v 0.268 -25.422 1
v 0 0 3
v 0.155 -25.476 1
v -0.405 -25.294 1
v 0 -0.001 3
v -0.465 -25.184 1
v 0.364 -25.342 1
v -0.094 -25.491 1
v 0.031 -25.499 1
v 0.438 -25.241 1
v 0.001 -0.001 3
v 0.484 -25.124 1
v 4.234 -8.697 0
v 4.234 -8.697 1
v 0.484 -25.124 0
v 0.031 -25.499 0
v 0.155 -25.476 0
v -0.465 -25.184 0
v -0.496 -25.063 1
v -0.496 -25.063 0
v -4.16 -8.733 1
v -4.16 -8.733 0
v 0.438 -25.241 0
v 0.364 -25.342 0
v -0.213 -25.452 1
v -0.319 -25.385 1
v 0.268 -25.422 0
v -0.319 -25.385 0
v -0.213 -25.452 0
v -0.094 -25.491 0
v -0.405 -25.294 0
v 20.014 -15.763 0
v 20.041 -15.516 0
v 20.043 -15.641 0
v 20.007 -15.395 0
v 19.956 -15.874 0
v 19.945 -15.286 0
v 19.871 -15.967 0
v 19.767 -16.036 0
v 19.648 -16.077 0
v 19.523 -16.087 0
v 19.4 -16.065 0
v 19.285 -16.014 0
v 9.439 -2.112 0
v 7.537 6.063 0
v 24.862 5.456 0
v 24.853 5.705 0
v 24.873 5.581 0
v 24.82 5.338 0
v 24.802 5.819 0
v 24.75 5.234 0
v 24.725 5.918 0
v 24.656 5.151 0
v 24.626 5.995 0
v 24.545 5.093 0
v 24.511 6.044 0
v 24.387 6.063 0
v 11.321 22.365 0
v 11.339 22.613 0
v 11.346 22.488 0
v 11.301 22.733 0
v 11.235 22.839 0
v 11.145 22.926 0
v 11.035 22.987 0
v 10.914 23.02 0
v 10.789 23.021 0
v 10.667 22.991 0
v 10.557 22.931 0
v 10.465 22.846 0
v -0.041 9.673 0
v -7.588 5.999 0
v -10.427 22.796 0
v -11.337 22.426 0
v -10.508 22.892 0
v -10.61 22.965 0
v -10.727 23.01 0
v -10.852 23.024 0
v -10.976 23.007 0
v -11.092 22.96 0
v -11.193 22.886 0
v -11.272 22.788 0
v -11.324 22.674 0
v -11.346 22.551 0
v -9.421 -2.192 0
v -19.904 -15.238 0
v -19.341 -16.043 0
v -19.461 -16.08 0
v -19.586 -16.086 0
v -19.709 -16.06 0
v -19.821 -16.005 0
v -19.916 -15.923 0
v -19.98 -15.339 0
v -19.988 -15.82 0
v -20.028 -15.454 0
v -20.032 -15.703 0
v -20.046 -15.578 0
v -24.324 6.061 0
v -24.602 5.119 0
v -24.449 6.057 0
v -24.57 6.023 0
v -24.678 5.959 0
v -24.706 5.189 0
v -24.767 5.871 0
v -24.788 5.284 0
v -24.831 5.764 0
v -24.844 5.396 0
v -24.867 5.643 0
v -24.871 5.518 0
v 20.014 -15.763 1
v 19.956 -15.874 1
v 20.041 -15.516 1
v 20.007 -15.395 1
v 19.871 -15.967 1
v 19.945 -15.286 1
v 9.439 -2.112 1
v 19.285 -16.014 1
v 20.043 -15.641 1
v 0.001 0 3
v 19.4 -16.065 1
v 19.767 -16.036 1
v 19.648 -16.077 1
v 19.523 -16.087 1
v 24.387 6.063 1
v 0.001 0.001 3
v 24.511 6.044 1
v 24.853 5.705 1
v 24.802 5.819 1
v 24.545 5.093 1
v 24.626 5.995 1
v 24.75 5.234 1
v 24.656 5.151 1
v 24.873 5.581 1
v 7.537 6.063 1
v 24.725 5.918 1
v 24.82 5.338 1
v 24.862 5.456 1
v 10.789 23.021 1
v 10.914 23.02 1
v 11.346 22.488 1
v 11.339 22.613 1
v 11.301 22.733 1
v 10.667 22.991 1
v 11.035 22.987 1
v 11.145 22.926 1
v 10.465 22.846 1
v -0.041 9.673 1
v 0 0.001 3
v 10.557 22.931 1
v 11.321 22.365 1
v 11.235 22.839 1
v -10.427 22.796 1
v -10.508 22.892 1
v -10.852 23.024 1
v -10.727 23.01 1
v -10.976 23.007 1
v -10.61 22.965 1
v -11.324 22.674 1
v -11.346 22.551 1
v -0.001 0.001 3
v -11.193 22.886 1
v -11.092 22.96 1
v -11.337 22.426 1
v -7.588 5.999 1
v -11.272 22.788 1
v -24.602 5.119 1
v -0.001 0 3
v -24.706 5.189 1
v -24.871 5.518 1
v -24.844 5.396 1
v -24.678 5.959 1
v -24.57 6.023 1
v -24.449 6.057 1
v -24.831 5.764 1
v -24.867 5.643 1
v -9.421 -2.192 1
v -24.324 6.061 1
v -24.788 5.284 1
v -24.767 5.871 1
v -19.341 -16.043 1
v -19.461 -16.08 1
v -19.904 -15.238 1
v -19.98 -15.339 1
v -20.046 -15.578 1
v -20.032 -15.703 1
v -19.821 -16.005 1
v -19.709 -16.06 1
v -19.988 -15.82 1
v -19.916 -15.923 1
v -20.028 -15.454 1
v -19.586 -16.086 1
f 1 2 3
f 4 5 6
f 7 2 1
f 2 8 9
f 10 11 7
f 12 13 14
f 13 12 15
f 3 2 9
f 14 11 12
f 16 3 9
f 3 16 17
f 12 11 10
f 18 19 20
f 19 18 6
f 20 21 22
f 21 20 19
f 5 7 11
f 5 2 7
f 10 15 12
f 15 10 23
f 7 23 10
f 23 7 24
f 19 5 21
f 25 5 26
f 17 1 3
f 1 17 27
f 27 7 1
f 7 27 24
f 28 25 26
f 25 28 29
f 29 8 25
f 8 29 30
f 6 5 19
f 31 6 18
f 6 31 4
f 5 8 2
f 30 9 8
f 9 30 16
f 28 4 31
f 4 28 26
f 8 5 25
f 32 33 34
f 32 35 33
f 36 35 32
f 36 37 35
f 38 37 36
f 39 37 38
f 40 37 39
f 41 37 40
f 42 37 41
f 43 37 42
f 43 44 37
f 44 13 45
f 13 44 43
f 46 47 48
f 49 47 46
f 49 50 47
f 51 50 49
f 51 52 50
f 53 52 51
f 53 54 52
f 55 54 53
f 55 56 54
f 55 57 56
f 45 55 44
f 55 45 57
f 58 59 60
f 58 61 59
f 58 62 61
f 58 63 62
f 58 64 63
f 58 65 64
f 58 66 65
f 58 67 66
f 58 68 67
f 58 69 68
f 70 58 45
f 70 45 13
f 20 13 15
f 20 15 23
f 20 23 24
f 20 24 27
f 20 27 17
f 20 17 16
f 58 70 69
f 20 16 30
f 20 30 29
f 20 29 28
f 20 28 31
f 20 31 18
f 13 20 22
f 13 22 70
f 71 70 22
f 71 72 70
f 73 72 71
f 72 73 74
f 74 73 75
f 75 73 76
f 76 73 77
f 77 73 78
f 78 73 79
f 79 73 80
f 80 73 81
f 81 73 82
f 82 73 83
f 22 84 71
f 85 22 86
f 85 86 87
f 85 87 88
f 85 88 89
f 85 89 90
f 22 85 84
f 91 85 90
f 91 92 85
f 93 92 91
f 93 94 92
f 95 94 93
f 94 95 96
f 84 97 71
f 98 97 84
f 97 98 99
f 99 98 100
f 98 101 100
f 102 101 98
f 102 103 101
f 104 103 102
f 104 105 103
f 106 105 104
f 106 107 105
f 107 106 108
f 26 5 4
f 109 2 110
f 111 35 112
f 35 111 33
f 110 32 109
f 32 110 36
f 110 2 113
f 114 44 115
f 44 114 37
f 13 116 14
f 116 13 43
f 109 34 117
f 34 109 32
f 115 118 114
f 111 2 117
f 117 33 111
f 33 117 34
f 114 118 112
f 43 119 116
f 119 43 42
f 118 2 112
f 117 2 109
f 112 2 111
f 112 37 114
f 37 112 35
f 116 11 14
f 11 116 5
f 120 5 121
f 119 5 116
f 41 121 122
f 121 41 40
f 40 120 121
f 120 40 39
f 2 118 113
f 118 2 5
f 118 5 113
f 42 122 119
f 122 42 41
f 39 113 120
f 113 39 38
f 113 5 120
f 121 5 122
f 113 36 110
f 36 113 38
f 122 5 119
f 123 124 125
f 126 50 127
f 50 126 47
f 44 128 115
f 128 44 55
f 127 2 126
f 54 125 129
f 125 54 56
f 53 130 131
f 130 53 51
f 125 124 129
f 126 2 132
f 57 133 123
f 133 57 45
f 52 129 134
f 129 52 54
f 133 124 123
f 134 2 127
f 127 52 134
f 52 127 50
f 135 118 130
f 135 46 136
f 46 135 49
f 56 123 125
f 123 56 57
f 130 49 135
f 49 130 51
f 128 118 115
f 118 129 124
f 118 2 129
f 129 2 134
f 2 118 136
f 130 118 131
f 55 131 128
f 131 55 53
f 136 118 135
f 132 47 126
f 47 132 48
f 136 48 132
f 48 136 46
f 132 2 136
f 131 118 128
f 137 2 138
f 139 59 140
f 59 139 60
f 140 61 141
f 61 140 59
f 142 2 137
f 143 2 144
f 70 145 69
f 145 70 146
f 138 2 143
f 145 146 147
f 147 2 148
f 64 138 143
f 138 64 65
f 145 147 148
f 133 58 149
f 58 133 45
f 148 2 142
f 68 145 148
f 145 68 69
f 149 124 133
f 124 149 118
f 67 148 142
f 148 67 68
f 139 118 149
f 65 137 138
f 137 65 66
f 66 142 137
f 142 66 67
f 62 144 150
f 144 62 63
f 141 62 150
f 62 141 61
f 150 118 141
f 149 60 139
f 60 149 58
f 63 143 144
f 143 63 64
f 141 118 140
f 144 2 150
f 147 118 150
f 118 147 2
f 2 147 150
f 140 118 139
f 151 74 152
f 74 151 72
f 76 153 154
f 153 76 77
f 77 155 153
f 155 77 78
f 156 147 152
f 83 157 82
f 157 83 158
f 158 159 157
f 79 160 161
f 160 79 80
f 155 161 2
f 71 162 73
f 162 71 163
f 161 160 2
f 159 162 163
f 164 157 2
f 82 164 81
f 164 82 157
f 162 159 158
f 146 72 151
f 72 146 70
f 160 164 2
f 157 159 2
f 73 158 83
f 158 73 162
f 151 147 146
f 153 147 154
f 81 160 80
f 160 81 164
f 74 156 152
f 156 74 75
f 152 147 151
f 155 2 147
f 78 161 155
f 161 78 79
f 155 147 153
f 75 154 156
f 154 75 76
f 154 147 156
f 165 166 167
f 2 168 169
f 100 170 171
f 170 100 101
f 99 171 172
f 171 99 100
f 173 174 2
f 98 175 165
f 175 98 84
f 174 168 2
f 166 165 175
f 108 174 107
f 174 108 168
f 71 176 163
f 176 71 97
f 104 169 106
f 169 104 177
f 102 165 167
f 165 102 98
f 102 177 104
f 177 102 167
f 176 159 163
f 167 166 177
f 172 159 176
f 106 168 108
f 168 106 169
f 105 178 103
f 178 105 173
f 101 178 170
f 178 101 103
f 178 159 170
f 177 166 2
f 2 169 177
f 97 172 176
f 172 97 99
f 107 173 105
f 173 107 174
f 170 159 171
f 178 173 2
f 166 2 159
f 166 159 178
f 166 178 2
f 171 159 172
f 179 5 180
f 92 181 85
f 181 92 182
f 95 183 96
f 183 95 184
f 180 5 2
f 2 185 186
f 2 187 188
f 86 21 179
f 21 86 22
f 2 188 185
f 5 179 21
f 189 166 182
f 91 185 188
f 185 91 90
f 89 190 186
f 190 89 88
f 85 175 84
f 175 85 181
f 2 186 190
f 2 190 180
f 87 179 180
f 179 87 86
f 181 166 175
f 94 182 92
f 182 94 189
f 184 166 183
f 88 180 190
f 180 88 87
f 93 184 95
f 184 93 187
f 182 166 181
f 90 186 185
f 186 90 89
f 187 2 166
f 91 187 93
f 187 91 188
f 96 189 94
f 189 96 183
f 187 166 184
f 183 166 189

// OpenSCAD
// number of points on the star (3 or more makes sense)
_points = 7;
// length of ech point from center.  1/2 the rounding value will be added to the length
_point_len = 25;
// used to adjust width of each point +/-
_adjust = 0;
// point height at end of points (thinkness of objet at thinest part. Should be less than cent_h
_pnt_h = 1;
// height at center of star. set equal to pnt_h for flat object
_cent_h = 3;
// diameter of rounding at end of point (must be greater than 0).
_rnd=1;

// resolution for rounded point
_fn = 25;


// modules in library:
module star_3d(points, point_len, adjust=0, pnt_h =1, cent_h=1, rnd=0.1, fn=25)
{
    // star_3d: star with raised center.
    //----------------------------------------------//
    // points = num points on star (should be >3.  
    //          Using 3 may require addisional 
    //          adjust be applied.)
    // point_len = len of point on star 
    //              (actual len of point will add 
    //              1/2 rnd to the length.)
    // adjust = +/- adjust of width of point
    // pnt_h = height of star at end of point
    // cent_h = height of star in center needs to be > pnt_h to have effect.
    // rnd = roundness of end of point (diameter)
    // fn = $fn value for rounded point
    //----------------------------------------------//
    
    point_deg= 360/points;
    point_deg_adjusted = point_deg + (-point_deg/2) +  adjust;
    
    if(points == 3 && adjust == 0)
    {  // make a pyramid (this is to avoid rendering 
       //            issues in this special case)
        hull()
        {
           for(i=[0:2])
           {
               rotate([0,0,i*point_deg])
               translate([point_len,0,0])
                    cylinder(pnt_h, d=rnd, $fn=fn);
           }
           cylinder(cent_h, d=.001);
        }
    }
    else
    { // use algorithm
        for(i=[0:points-1])
        {
            rotate([0,0,i * point_deg]) 
                translate([0,-point_len,0]) 
                point(point_deg_adjusted, 
                      point_len, 
                      rnd, 
                      pnt_h, 
                      cent_h, 
                      fn);
        }
    }

}

module point(deg, leng, rnd, h1, h2, fn=25)
{   // create a point of the star.
    hull()
    {
        cylinder(h1, d=rnd, $fn=fn);
        translate([0,leng,0]) cylinder(h2, d=.001);
        rotate([0,0,-deg/2]) 
            translate([0,leng,0]) cylinder(h1, d=rnd);
        rotate([0,0,deg/2]) 
            translate([0,leng,0]) cylinder(h1, d=rnd);
    }
}


// test object:
star_3d(points = _points,
        point_len = _point_len,
        adjust = _adjust, 
        pnt_h = _pnt_h, 
        cent_h =_cent_h, 
        rnd = _rnd,
        fn = _fn);
